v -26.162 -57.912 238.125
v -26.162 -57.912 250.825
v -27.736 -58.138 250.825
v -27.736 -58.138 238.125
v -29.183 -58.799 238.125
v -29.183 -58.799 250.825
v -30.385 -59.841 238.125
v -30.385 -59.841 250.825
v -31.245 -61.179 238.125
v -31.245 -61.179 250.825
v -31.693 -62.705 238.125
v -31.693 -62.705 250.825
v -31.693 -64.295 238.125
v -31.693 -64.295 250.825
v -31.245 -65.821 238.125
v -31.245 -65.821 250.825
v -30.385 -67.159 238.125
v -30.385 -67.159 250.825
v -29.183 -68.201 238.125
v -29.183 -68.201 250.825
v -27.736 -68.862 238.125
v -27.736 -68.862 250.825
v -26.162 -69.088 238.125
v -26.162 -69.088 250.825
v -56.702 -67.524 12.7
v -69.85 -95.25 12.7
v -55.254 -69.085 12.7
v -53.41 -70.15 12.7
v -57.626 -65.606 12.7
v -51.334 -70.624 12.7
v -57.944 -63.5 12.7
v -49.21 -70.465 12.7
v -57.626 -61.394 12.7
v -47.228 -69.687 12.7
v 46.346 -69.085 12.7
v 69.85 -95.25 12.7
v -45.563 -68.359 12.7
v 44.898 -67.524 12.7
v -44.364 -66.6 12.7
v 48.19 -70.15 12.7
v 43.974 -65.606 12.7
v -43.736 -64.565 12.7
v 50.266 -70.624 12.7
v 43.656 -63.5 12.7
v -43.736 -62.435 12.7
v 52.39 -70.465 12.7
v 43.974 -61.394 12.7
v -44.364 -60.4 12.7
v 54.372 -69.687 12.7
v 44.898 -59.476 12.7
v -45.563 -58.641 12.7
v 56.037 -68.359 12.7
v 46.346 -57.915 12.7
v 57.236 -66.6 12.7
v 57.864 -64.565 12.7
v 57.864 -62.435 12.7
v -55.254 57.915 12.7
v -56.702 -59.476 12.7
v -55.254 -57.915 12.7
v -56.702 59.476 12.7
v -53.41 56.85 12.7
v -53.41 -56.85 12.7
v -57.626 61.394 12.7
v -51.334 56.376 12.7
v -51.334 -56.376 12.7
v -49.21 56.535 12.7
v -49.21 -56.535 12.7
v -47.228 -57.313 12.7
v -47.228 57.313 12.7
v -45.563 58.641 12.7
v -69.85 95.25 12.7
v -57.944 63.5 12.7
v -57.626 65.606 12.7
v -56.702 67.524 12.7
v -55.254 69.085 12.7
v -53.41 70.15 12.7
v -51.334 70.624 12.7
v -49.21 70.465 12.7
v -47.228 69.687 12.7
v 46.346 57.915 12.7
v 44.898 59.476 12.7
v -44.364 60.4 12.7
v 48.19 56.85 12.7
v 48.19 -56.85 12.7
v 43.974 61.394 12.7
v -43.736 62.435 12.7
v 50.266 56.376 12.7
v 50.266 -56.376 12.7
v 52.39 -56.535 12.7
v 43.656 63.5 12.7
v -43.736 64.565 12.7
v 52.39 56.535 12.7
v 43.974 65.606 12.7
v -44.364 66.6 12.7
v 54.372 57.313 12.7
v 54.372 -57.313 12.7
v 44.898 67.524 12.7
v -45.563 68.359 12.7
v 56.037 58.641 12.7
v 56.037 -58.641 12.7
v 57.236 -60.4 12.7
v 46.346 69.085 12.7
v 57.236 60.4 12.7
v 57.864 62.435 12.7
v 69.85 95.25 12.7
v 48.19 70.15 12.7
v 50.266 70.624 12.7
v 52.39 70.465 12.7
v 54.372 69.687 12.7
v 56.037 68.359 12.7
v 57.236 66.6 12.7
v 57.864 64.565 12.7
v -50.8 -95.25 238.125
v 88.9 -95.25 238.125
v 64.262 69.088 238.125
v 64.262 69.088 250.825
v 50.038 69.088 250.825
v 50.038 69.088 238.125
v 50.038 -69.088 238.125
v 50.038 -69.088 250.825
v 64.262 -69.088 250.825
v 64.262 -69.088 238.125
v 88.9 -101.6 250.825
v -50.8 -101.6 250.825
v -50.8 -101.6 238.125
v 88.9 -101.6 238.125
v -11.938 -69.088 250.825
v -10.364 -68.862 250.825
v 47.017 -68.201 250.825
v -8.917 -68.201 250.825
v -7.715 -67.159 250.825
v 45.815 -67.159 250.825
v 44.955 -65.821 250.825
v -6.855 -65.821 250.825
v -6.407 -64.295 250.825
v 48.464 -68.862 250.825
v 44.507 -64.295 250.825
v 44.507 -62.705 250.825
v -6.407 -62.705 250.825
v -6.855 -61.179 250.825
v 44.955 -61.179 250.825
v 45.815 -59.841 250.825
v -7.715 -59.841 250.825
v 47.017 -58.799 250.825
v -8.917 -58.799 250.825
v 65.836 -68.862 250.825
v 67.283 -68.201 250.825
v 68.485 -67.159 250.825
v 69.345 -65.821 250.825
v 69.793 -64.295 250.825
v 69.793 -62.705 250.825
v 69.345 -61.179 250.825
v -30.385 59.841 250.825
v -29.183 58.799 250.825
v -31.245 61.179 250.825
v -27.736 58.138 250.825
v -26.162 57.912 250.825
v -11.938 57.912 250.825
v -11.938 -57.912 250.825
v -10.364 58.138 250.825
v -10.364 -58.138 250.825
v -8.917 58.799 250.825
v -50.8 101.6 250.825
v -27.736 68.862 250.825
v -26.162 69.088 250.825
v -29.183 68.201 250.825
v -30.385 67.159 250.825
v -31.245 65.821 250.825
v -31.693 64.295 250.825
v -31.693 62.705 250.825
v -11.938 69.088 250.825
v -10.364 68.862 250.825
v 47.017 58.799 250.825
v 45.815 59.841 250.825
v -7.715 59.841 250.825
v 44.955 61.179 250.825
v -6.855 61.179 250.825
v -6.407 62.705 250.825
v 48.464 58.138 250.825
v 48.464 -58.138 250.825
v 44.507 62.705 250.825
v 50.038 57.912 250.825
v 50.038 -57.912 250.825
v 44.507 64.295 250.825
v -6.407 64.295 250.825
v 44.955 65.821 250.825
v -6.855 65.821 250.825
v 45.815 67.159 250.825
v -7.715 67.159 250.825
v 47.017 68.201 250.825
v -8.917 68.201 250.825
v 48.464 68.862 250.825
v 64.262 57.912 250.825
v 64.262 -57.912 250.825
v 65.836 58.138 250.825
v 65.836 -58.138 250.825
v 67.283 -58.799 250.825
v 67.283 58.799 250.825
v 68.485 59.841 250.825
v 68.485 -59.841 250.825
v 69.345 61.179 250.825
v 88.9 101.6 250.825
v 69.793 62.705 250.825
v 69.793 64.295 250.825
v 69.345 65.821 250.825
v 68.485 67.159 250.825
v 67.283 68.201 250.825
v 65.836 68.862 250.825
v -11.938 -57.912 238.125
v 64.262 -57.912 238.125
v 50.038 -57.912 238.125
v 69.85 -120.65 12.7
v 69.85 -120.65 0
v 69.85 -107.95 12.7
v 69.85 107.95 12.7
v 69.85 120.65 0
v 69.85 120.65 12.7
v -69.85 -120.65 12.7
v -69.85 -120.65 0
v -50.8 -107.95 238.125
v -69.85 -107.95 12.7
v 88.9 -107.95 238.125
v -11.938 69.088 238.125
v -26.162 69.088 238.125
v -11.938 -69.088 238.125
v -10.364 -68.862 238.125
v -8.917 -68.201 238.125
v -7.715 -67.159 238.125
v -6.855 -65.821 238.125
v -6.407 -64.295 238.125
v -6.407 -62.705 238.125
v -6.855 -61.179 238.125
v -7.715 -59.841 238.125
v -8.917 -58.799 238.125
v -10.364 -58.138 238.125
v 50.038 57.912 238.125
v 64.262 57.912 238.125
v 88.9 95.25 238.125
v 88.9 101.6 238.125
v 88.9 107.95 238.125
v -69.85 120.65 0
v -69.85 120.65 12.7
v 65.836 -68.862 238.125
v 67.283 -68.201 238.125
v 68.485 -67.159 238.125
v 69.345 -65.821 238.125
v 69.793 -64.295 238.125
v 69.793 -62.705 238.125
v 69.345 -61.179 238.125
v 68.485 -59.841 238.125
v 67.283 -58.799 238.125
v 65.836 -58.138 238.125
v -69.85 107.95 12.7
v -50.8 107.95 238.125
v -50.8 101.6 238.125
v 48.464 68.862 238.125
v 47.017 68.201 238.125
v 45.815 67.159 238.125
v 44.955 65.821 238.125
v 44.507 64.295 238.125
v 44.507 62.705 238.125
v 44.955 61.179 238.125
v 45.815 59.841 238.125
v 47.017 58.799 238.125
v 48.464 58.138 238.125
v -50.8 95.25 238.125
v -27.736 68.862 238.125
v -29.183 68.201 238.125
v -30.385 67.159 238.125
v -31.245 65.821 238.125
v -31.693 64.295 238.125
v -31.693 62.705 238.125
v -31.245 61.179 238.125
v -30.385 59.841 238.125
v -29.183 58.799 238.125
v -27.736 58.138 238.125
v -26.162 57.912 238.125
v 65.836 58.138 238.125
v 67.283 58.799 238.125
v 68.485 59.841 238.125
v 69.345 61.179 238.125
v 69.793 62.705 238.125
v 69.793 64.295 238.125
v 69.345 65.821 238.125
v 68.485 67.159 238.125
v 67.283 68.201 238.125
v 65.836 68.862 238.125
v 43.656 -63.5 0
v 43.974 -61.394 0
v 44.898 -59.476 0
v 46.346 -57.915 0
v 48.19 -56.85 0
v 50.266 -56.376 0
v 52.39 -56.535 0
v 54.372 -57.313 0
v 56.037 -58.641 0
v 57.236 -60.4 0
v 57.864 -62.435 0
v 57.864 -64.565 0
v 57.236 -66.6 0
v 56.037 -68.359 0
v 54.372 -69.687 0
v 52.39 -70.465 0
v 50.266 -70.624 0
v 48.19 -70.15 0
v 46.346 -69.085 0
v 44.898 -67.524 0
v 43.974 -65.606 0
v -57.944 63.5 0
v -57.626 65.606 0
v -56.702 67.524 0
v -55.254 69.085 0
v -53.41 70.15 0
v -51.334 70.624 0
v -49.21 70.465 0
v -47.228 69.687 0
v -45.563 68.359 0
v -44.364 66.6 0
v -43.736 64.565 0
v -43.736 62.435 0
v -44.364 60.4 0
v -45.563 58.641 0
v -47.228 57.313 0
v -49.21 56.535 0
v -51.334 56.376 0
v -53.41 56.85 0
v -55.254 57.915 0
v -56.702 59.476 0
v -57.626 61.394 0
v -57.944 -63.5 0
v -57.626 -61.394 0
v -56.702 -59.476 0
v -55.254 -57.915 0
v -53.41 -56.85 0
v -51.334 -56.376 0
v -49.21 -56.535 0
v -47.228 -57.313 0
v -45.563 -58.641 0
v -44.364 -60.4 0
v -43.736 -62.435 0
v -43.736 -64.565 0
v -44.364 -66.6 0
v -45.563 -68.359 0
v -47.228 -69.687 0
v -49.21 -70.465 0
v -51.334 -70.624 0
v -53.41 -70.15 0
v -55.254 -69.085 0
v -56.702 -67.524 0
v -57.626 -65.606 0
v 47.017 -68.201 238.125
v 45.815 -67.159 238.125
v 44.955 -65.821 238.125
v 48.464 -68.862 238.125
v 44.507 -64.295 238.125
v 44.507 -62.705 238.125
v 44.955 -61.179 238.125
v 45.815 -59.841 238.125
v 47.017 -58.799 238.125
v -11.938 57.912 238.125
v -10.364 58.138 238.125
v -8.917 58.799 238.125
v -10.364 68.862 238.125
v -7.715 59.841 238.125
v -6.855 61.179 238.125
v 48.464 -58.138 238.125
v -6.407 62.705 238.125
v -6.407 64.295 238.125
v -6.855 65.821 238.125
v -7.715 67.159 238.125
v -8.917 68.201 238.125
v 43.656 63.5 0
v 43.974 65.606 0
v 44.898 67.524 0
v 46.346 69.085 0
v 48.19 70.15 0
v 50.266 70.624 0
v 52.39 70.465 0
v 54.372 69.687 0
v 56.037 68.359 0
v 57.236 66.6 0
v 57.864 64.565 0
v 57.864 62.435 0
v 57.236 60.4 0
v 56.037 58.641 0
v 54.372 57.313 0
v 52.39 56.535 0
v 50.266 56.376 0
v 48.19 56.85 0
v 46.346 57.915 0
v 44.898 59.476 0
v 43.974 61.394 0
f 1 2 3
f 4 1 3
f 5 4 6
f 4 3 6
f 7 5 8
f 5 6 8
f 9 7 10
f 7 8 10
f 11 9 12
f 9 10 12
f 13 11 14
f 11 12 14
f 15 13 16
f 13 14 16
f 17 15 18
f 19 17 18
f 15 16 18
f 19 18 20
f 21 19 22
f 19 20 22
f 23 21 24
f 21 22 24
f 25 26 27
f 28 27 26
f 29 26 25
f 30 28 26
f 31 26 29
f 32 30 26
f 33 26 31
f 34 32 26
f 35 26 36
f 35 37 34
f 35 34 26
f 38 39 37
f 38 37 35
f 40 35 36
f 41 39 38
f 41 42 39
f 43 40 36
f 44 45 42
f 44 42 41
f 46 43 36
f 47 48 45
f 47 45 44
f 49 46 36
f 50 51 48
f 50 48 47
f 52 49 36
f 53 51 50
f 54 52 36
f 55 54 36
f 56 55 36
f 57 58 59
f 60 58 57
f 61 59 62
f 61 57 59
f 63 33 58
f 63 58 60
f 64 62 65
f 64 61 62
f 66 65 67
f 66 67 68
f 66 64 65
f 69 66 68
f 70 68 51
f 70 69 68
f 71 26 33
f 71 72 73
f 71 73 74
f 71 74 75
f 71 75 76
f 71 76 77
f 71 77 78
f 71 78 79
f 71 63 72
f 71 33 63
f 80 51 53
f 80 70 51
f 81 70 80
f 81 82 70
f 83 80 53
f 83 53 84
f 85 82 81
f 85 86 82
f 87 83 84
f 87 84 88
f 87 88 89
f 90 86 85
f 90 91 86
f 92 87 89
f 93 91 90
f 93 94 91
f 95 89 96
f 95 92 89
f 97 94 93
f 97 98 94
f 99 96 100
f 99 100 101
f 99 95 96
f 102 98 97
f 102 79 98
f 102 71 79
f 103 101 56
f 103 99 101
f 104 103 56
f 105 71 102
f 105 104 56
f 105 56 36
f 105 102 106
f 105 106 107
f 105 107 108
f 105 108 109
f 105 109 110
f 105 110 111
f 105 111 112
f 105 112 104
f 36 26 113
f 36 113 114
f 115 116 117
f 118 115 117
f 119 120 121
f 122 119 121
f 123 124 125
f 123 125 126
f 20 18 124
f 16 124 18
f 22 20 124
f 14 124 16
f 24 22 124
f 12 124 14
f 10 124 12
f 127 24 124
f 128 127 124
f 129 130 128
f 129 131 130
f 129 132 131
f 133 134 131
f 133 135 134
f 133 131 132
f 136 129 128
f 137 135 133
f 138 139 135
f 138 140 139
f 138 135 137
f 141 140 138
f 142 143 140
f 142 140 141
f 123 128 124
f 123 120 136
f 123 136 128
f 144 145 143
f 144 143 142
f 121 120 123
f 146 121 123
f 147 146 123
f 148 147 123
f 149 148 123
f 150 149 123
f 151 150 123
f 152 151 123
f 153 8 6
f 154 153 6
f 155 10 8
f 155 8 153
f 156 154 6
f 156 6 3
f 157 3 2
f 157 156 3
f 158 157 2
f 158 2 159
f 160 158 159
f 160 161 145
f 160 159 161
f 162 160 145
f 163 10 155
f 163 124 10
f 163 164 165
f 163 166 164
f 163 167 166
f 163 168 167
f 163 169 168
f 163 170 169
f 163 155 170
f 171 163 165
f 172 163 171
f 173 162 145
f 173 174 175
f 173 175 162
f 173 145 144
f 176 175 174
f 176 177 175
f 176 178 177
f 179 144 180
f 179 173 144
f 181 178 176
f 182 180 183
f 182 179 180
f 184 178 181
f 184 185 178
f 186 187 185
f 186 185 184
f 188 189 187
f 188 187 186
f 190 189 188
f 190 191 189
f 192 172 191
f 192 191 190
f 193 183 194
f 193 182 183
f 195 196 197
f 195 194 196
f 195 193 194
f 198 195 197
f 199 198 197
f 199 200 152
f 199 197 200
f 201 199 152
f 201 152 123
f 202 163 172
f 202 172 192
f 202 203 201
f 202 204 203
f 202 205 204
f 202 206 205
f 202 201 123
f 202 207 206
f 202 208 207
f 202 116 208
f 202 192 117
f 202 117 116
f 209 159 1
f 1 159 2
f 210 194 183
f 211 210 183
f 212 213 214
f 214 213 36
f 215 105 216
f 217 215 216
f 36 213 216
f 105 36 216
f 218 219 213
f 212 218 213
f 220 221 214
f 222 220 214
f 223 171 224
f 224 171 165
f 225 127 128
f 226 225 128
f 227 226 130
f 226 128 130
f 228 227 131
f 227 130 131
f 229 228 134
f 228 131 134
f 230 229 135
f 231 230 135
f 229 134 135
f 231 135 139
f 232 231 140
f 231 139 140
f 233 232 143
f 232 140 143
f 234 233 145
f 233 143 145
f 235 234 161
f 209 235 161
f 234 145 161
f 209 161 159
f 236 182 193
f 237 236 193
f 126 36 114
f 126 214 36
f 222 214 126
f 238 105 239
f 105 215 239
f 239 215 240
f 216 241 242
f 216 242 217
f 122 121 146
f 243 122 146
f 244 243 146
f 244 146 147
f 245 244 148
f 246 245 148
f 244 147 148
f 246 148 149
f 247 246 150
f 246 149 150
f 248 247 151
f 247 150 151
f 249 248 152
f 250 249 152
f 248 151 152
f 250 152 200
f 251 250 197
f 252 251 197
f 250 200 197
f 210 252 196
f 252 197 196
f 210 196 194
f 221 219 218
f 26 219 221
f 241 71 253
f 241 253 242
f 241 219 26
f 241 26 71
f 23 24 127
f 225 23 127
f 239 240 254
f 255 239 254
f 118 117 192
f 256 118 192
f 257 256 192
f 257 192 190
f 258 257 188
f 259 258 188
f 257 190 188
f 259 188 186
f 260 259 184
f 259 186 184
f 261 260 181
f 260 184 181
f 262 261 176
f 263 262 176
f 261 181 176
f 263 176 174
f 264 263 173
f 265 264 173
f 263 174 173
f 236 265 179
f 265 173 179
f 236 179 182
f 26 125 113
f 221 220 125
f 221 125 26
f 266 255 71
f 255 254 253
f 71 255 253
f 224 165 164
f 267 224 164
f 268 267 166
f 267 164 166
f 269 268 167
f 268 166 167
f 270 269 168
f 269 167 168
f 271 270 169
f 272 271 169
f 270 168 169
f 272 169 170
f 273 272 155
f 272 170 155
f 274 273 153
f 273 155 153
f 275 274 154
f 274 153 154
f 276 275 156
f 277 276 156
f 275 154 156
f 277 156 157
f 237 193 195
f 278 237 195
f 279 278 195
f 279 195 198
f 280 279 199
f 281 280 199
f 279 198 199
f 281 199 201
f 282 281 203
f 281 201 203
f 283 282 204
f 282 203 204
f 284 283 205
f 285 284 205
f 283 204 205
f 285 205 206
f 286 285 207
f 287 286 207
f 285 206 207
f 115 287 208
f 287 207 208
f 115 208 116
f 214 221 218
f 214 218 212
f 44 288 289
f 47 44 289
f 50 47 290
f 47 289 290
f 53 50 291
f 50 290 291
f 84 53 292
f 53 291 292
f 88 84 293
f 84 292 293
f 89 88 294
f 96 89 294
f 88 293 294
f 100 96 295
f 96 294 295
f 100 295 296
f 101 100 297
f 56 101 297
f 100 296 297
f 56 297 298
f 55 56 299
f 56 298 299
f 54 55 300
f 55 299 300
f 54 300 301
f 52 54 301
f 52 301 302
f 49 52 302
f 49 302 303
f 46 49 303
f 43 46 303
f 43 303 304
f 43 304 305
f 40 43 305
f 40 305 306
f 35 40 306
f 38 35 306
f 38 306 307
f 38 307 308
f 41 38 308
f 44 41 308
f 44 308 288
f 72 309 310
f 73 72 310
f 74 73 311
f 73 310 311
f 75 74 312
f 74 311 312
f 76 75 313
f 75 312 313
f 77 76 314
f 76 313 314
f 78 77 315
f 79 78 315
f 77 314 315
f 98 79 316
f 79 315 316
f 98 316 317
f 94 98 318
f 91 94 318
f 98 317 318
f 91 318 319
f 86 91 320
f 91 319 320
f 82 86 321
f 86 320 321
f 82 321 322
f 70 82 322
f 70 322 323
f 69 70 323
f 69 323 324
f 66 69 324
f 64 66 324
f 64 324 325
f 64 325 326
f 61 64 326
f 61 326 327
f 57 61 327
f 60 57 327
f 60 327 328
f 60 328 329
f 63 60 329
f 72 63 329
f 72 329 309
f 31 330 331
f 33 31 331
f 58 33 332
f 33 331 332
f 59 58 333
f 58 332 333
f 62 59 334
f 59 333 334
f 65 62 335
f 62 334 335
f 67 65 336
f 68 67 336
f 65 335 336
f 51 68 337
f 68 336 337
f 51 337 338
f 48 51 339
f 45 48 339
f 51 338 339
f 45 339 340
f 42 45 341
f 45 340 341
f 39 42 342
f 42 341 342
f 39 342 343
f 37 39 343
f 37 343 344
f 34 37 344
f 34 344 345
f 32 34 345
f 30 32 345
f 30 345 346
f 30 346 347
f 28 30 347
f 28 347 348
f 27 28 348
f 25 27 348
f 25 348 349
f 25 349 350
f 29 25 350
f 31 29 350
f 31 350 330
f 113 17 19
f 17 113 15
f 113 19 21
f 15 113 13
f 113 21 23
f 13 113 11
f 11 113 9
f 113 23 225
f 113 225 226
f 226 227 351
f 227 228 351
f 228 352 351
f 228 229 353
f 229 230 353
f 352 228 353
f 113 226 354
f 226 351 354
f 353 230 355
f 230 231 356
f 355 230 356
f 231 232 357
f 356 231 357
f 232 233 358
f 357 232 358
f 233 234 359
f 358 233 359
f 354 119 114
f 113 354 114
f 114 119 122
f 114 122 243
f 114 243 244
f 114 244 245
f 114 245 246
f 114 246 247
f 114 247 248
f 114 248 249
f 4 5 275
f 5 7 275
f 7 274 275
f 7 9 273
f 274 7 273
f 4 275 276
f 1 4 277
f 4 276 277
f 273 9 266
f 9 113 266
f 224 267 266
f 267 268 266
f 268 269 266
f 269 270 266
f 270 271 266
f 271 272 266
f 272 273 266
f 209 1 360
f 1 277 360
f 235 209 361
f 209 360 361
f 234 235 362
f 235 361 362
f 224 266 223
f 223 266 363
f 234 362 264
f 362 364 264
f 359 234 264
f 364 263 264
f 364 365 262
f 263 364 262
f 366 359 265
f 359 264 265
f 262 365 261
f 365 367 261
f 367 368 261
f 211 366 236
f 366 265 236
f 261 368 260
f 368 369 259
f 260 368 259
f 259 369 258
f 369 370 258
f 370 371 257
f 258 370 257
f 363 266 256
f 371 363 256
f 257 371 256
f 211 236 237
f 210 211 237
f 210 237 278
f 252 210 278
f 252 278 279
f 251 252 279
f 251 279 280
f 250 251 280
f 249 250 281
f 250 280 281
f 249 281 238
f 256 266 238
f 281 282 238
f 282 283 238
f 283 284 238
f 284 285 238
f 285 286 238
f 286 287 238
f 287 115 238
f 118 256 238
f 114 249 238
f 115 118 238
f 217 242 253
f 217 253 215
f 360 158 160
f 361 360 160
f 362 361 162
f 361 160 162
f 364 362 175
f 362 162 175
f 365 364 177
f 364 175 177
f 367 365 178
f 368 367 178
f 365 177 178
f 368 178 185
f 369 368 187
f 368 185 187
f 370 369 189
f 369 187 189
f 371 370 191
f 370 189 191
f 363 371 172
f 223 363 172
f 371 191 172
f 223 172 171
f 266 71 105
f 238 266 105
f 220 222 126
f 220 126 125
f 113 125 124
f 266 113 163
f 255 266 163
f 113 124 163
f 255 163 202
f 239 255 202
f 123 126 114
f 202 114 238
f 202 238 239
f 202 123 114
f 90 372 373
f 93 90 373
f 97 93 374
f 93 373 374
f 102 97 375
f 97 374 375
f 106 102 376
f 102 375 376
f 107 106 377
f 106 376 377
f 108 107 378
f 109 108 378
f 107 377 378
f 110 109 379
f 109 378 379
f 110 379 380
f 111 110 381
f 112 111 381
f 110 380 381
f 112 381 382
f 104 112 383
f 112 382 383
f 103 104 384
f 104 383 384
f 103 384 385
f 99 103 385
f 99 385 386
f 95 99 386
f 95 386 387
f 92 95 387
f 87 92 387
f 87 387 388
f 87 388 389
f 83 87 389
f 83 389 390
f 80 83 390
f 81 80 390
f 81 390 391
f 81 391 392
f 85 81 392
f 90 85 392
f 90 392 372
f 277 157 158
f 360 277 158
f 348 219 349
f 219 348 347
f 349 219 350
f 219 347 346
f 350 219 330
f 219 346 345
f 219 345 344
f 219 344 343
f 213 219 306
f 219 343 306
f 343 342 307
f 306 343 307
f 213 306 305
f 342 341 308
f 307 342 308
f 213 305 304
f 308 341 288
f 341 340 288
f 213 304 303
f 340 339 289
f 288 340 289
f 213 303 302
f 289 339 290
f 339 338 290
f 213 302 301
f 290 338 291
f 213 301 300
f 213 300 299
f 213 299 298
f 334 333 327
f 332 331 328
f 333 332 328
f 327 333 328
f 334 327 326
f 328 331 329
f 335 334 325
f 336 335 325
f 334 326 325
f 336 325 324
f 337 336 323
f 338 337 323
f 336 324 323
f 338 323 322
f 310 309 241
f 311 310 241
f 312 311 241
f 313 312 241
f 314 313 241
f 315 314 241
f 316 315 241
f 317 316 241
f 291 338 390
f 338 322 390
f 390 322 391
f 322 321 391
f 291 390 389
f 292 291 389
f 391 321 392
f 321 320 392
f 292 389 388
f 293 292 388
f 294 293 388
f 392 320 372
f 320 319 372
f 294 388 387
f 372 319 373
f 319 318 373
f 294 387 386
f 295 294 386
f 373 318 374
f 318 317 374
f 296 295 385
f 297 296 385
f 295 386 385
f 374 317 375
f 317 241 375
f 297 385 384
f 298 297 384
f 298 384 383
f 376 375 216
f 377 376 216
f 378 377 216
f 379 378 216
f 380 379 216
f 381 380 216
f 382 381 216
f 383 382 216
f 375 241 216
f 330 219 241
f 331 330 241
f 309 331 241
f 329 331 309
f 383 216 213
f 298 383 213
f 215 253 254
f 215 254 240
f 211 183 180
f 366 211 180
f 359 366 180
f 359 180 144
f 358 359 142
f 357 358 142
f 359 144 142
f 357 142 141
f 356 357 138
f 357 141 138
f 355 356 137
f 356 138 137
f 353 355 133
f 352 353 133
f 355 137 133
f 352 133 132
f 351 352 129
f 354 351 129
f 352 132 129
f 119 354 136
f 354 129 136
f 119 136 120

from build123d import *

# Parameters (mm, degrees)
F1_W      = 139.7
F1_H      = 241.3
F2_DEPTH  = 12.7
F4_D      = 14.2875
F5_W      = 139.7
F5_H      = 203.2
F6_DEPTH  = 12.7
F8_DEPTH  = 25.4
F10_DEPTH = 6.35


# Not quite as in the source:
# - a length typed as a fraction of an inch, garbled in the dataset ("3 / 203.2 mm" for 3/8 in), is restored


with BuildPart() as f2:
    # F1 (on Top) → F2 (new body)
    with BuildSketch(Plane.XY):
        Rectangle(F1_W, F1_H)
    extrude(amount=F2_DEPTH)

    # F4 (through all)
    with Locations(Plane.XY.offset(12.7)):
        with Locations((-50.8, 63.5), (50.8, 63.5), (50.8, -63.5), (-50.8, -63.5)):
            Hole(F4_D / 2)



with BuildPart() as f6:
    # F5 (on offset) → F6 (new body)
    with BuildSketch(Plane.XY.offset(250.825)):
        with Locations((19.05, 0)):
            Rectangle(F5_W, F5_H)
    extrude(amount=-F6_DEPTH)

    # F7 (on face) → F8 (cut)
    with BuildSketch(Plane.XY.offset(250.825)):
        with BuildLine():
            ThreePointArc((-26.162, -57.912), (-31.75, -63.5), (-26.162, -69.088))
            Line((-26.162, -69.088), (-11.938, -69.088))
            ThreePointArc((-11.938, -69.088), (-6.35, -63.5), (-11.938, -57.912))
            Line((-11.938, -57.912), (-26.162, -57.912))
        make_face()
        with BuildLine():
            Line((50.038, -69.088), (64.262, -69.088))
            ThreePointArc((64.262, -69.088), (69.85, -63.5), (64.262, -57.912))
            Line((64.262, -57.912), (50.038, -57.912))
            ThreePointArc((50.038, -57.912), (44.45, -63.5), (50.038, -69.088))
        make_face()
        with BuildLine():
            ThreePointArc((64.262, 57.912), (69.85, 63.5), (64.262, 69.088))
            Line((64.262, 69.088), (50.038, 69.088))
            ThreePointArc((50.038, 69.088), (44.45, 63.5), (50.038, 57.912))
            Line((50.038, 57.912), (64.262, 57.912))
        make_face()
        with BuildLine():
            Line((-11.938, 69.088), (-26.162, 69.088))
            ThreePointArc((-26.162, 69.088), (-31.75, 63.5), (-26.162, 57.912))
            Line((-26.162, 57.912), (-11.938, 57.912))
            ThreePointArc((-11.938, 57.912), (-6.35, 63.5), (-11.938, 69.088))
        make_face()
    extrude(amount=-F8_DEPTH, mode=Mode.SUBTRACT)


with BuildPart() as f2_1:
    add(f2.part)

    add(f6.part)  # F10 merges F6
    # F9 (on face) → F10 (join, symmetric)
    with BuildSketch(Plane.XZ.offset(101.6)):
        Polygon((88.9, 238.125), (-50.8, 238.125), (-69.85, 12.7), (69.85, 12.7), align=None)
    extrude(amount=F10_DEPTH, both=True)

    # F11: F2 across plane


with BuildPart() as f2_2:
    add(f2_1.part)
    add(f2_1.part.mirror(Plane.XZ))


solid = f2_2.part
